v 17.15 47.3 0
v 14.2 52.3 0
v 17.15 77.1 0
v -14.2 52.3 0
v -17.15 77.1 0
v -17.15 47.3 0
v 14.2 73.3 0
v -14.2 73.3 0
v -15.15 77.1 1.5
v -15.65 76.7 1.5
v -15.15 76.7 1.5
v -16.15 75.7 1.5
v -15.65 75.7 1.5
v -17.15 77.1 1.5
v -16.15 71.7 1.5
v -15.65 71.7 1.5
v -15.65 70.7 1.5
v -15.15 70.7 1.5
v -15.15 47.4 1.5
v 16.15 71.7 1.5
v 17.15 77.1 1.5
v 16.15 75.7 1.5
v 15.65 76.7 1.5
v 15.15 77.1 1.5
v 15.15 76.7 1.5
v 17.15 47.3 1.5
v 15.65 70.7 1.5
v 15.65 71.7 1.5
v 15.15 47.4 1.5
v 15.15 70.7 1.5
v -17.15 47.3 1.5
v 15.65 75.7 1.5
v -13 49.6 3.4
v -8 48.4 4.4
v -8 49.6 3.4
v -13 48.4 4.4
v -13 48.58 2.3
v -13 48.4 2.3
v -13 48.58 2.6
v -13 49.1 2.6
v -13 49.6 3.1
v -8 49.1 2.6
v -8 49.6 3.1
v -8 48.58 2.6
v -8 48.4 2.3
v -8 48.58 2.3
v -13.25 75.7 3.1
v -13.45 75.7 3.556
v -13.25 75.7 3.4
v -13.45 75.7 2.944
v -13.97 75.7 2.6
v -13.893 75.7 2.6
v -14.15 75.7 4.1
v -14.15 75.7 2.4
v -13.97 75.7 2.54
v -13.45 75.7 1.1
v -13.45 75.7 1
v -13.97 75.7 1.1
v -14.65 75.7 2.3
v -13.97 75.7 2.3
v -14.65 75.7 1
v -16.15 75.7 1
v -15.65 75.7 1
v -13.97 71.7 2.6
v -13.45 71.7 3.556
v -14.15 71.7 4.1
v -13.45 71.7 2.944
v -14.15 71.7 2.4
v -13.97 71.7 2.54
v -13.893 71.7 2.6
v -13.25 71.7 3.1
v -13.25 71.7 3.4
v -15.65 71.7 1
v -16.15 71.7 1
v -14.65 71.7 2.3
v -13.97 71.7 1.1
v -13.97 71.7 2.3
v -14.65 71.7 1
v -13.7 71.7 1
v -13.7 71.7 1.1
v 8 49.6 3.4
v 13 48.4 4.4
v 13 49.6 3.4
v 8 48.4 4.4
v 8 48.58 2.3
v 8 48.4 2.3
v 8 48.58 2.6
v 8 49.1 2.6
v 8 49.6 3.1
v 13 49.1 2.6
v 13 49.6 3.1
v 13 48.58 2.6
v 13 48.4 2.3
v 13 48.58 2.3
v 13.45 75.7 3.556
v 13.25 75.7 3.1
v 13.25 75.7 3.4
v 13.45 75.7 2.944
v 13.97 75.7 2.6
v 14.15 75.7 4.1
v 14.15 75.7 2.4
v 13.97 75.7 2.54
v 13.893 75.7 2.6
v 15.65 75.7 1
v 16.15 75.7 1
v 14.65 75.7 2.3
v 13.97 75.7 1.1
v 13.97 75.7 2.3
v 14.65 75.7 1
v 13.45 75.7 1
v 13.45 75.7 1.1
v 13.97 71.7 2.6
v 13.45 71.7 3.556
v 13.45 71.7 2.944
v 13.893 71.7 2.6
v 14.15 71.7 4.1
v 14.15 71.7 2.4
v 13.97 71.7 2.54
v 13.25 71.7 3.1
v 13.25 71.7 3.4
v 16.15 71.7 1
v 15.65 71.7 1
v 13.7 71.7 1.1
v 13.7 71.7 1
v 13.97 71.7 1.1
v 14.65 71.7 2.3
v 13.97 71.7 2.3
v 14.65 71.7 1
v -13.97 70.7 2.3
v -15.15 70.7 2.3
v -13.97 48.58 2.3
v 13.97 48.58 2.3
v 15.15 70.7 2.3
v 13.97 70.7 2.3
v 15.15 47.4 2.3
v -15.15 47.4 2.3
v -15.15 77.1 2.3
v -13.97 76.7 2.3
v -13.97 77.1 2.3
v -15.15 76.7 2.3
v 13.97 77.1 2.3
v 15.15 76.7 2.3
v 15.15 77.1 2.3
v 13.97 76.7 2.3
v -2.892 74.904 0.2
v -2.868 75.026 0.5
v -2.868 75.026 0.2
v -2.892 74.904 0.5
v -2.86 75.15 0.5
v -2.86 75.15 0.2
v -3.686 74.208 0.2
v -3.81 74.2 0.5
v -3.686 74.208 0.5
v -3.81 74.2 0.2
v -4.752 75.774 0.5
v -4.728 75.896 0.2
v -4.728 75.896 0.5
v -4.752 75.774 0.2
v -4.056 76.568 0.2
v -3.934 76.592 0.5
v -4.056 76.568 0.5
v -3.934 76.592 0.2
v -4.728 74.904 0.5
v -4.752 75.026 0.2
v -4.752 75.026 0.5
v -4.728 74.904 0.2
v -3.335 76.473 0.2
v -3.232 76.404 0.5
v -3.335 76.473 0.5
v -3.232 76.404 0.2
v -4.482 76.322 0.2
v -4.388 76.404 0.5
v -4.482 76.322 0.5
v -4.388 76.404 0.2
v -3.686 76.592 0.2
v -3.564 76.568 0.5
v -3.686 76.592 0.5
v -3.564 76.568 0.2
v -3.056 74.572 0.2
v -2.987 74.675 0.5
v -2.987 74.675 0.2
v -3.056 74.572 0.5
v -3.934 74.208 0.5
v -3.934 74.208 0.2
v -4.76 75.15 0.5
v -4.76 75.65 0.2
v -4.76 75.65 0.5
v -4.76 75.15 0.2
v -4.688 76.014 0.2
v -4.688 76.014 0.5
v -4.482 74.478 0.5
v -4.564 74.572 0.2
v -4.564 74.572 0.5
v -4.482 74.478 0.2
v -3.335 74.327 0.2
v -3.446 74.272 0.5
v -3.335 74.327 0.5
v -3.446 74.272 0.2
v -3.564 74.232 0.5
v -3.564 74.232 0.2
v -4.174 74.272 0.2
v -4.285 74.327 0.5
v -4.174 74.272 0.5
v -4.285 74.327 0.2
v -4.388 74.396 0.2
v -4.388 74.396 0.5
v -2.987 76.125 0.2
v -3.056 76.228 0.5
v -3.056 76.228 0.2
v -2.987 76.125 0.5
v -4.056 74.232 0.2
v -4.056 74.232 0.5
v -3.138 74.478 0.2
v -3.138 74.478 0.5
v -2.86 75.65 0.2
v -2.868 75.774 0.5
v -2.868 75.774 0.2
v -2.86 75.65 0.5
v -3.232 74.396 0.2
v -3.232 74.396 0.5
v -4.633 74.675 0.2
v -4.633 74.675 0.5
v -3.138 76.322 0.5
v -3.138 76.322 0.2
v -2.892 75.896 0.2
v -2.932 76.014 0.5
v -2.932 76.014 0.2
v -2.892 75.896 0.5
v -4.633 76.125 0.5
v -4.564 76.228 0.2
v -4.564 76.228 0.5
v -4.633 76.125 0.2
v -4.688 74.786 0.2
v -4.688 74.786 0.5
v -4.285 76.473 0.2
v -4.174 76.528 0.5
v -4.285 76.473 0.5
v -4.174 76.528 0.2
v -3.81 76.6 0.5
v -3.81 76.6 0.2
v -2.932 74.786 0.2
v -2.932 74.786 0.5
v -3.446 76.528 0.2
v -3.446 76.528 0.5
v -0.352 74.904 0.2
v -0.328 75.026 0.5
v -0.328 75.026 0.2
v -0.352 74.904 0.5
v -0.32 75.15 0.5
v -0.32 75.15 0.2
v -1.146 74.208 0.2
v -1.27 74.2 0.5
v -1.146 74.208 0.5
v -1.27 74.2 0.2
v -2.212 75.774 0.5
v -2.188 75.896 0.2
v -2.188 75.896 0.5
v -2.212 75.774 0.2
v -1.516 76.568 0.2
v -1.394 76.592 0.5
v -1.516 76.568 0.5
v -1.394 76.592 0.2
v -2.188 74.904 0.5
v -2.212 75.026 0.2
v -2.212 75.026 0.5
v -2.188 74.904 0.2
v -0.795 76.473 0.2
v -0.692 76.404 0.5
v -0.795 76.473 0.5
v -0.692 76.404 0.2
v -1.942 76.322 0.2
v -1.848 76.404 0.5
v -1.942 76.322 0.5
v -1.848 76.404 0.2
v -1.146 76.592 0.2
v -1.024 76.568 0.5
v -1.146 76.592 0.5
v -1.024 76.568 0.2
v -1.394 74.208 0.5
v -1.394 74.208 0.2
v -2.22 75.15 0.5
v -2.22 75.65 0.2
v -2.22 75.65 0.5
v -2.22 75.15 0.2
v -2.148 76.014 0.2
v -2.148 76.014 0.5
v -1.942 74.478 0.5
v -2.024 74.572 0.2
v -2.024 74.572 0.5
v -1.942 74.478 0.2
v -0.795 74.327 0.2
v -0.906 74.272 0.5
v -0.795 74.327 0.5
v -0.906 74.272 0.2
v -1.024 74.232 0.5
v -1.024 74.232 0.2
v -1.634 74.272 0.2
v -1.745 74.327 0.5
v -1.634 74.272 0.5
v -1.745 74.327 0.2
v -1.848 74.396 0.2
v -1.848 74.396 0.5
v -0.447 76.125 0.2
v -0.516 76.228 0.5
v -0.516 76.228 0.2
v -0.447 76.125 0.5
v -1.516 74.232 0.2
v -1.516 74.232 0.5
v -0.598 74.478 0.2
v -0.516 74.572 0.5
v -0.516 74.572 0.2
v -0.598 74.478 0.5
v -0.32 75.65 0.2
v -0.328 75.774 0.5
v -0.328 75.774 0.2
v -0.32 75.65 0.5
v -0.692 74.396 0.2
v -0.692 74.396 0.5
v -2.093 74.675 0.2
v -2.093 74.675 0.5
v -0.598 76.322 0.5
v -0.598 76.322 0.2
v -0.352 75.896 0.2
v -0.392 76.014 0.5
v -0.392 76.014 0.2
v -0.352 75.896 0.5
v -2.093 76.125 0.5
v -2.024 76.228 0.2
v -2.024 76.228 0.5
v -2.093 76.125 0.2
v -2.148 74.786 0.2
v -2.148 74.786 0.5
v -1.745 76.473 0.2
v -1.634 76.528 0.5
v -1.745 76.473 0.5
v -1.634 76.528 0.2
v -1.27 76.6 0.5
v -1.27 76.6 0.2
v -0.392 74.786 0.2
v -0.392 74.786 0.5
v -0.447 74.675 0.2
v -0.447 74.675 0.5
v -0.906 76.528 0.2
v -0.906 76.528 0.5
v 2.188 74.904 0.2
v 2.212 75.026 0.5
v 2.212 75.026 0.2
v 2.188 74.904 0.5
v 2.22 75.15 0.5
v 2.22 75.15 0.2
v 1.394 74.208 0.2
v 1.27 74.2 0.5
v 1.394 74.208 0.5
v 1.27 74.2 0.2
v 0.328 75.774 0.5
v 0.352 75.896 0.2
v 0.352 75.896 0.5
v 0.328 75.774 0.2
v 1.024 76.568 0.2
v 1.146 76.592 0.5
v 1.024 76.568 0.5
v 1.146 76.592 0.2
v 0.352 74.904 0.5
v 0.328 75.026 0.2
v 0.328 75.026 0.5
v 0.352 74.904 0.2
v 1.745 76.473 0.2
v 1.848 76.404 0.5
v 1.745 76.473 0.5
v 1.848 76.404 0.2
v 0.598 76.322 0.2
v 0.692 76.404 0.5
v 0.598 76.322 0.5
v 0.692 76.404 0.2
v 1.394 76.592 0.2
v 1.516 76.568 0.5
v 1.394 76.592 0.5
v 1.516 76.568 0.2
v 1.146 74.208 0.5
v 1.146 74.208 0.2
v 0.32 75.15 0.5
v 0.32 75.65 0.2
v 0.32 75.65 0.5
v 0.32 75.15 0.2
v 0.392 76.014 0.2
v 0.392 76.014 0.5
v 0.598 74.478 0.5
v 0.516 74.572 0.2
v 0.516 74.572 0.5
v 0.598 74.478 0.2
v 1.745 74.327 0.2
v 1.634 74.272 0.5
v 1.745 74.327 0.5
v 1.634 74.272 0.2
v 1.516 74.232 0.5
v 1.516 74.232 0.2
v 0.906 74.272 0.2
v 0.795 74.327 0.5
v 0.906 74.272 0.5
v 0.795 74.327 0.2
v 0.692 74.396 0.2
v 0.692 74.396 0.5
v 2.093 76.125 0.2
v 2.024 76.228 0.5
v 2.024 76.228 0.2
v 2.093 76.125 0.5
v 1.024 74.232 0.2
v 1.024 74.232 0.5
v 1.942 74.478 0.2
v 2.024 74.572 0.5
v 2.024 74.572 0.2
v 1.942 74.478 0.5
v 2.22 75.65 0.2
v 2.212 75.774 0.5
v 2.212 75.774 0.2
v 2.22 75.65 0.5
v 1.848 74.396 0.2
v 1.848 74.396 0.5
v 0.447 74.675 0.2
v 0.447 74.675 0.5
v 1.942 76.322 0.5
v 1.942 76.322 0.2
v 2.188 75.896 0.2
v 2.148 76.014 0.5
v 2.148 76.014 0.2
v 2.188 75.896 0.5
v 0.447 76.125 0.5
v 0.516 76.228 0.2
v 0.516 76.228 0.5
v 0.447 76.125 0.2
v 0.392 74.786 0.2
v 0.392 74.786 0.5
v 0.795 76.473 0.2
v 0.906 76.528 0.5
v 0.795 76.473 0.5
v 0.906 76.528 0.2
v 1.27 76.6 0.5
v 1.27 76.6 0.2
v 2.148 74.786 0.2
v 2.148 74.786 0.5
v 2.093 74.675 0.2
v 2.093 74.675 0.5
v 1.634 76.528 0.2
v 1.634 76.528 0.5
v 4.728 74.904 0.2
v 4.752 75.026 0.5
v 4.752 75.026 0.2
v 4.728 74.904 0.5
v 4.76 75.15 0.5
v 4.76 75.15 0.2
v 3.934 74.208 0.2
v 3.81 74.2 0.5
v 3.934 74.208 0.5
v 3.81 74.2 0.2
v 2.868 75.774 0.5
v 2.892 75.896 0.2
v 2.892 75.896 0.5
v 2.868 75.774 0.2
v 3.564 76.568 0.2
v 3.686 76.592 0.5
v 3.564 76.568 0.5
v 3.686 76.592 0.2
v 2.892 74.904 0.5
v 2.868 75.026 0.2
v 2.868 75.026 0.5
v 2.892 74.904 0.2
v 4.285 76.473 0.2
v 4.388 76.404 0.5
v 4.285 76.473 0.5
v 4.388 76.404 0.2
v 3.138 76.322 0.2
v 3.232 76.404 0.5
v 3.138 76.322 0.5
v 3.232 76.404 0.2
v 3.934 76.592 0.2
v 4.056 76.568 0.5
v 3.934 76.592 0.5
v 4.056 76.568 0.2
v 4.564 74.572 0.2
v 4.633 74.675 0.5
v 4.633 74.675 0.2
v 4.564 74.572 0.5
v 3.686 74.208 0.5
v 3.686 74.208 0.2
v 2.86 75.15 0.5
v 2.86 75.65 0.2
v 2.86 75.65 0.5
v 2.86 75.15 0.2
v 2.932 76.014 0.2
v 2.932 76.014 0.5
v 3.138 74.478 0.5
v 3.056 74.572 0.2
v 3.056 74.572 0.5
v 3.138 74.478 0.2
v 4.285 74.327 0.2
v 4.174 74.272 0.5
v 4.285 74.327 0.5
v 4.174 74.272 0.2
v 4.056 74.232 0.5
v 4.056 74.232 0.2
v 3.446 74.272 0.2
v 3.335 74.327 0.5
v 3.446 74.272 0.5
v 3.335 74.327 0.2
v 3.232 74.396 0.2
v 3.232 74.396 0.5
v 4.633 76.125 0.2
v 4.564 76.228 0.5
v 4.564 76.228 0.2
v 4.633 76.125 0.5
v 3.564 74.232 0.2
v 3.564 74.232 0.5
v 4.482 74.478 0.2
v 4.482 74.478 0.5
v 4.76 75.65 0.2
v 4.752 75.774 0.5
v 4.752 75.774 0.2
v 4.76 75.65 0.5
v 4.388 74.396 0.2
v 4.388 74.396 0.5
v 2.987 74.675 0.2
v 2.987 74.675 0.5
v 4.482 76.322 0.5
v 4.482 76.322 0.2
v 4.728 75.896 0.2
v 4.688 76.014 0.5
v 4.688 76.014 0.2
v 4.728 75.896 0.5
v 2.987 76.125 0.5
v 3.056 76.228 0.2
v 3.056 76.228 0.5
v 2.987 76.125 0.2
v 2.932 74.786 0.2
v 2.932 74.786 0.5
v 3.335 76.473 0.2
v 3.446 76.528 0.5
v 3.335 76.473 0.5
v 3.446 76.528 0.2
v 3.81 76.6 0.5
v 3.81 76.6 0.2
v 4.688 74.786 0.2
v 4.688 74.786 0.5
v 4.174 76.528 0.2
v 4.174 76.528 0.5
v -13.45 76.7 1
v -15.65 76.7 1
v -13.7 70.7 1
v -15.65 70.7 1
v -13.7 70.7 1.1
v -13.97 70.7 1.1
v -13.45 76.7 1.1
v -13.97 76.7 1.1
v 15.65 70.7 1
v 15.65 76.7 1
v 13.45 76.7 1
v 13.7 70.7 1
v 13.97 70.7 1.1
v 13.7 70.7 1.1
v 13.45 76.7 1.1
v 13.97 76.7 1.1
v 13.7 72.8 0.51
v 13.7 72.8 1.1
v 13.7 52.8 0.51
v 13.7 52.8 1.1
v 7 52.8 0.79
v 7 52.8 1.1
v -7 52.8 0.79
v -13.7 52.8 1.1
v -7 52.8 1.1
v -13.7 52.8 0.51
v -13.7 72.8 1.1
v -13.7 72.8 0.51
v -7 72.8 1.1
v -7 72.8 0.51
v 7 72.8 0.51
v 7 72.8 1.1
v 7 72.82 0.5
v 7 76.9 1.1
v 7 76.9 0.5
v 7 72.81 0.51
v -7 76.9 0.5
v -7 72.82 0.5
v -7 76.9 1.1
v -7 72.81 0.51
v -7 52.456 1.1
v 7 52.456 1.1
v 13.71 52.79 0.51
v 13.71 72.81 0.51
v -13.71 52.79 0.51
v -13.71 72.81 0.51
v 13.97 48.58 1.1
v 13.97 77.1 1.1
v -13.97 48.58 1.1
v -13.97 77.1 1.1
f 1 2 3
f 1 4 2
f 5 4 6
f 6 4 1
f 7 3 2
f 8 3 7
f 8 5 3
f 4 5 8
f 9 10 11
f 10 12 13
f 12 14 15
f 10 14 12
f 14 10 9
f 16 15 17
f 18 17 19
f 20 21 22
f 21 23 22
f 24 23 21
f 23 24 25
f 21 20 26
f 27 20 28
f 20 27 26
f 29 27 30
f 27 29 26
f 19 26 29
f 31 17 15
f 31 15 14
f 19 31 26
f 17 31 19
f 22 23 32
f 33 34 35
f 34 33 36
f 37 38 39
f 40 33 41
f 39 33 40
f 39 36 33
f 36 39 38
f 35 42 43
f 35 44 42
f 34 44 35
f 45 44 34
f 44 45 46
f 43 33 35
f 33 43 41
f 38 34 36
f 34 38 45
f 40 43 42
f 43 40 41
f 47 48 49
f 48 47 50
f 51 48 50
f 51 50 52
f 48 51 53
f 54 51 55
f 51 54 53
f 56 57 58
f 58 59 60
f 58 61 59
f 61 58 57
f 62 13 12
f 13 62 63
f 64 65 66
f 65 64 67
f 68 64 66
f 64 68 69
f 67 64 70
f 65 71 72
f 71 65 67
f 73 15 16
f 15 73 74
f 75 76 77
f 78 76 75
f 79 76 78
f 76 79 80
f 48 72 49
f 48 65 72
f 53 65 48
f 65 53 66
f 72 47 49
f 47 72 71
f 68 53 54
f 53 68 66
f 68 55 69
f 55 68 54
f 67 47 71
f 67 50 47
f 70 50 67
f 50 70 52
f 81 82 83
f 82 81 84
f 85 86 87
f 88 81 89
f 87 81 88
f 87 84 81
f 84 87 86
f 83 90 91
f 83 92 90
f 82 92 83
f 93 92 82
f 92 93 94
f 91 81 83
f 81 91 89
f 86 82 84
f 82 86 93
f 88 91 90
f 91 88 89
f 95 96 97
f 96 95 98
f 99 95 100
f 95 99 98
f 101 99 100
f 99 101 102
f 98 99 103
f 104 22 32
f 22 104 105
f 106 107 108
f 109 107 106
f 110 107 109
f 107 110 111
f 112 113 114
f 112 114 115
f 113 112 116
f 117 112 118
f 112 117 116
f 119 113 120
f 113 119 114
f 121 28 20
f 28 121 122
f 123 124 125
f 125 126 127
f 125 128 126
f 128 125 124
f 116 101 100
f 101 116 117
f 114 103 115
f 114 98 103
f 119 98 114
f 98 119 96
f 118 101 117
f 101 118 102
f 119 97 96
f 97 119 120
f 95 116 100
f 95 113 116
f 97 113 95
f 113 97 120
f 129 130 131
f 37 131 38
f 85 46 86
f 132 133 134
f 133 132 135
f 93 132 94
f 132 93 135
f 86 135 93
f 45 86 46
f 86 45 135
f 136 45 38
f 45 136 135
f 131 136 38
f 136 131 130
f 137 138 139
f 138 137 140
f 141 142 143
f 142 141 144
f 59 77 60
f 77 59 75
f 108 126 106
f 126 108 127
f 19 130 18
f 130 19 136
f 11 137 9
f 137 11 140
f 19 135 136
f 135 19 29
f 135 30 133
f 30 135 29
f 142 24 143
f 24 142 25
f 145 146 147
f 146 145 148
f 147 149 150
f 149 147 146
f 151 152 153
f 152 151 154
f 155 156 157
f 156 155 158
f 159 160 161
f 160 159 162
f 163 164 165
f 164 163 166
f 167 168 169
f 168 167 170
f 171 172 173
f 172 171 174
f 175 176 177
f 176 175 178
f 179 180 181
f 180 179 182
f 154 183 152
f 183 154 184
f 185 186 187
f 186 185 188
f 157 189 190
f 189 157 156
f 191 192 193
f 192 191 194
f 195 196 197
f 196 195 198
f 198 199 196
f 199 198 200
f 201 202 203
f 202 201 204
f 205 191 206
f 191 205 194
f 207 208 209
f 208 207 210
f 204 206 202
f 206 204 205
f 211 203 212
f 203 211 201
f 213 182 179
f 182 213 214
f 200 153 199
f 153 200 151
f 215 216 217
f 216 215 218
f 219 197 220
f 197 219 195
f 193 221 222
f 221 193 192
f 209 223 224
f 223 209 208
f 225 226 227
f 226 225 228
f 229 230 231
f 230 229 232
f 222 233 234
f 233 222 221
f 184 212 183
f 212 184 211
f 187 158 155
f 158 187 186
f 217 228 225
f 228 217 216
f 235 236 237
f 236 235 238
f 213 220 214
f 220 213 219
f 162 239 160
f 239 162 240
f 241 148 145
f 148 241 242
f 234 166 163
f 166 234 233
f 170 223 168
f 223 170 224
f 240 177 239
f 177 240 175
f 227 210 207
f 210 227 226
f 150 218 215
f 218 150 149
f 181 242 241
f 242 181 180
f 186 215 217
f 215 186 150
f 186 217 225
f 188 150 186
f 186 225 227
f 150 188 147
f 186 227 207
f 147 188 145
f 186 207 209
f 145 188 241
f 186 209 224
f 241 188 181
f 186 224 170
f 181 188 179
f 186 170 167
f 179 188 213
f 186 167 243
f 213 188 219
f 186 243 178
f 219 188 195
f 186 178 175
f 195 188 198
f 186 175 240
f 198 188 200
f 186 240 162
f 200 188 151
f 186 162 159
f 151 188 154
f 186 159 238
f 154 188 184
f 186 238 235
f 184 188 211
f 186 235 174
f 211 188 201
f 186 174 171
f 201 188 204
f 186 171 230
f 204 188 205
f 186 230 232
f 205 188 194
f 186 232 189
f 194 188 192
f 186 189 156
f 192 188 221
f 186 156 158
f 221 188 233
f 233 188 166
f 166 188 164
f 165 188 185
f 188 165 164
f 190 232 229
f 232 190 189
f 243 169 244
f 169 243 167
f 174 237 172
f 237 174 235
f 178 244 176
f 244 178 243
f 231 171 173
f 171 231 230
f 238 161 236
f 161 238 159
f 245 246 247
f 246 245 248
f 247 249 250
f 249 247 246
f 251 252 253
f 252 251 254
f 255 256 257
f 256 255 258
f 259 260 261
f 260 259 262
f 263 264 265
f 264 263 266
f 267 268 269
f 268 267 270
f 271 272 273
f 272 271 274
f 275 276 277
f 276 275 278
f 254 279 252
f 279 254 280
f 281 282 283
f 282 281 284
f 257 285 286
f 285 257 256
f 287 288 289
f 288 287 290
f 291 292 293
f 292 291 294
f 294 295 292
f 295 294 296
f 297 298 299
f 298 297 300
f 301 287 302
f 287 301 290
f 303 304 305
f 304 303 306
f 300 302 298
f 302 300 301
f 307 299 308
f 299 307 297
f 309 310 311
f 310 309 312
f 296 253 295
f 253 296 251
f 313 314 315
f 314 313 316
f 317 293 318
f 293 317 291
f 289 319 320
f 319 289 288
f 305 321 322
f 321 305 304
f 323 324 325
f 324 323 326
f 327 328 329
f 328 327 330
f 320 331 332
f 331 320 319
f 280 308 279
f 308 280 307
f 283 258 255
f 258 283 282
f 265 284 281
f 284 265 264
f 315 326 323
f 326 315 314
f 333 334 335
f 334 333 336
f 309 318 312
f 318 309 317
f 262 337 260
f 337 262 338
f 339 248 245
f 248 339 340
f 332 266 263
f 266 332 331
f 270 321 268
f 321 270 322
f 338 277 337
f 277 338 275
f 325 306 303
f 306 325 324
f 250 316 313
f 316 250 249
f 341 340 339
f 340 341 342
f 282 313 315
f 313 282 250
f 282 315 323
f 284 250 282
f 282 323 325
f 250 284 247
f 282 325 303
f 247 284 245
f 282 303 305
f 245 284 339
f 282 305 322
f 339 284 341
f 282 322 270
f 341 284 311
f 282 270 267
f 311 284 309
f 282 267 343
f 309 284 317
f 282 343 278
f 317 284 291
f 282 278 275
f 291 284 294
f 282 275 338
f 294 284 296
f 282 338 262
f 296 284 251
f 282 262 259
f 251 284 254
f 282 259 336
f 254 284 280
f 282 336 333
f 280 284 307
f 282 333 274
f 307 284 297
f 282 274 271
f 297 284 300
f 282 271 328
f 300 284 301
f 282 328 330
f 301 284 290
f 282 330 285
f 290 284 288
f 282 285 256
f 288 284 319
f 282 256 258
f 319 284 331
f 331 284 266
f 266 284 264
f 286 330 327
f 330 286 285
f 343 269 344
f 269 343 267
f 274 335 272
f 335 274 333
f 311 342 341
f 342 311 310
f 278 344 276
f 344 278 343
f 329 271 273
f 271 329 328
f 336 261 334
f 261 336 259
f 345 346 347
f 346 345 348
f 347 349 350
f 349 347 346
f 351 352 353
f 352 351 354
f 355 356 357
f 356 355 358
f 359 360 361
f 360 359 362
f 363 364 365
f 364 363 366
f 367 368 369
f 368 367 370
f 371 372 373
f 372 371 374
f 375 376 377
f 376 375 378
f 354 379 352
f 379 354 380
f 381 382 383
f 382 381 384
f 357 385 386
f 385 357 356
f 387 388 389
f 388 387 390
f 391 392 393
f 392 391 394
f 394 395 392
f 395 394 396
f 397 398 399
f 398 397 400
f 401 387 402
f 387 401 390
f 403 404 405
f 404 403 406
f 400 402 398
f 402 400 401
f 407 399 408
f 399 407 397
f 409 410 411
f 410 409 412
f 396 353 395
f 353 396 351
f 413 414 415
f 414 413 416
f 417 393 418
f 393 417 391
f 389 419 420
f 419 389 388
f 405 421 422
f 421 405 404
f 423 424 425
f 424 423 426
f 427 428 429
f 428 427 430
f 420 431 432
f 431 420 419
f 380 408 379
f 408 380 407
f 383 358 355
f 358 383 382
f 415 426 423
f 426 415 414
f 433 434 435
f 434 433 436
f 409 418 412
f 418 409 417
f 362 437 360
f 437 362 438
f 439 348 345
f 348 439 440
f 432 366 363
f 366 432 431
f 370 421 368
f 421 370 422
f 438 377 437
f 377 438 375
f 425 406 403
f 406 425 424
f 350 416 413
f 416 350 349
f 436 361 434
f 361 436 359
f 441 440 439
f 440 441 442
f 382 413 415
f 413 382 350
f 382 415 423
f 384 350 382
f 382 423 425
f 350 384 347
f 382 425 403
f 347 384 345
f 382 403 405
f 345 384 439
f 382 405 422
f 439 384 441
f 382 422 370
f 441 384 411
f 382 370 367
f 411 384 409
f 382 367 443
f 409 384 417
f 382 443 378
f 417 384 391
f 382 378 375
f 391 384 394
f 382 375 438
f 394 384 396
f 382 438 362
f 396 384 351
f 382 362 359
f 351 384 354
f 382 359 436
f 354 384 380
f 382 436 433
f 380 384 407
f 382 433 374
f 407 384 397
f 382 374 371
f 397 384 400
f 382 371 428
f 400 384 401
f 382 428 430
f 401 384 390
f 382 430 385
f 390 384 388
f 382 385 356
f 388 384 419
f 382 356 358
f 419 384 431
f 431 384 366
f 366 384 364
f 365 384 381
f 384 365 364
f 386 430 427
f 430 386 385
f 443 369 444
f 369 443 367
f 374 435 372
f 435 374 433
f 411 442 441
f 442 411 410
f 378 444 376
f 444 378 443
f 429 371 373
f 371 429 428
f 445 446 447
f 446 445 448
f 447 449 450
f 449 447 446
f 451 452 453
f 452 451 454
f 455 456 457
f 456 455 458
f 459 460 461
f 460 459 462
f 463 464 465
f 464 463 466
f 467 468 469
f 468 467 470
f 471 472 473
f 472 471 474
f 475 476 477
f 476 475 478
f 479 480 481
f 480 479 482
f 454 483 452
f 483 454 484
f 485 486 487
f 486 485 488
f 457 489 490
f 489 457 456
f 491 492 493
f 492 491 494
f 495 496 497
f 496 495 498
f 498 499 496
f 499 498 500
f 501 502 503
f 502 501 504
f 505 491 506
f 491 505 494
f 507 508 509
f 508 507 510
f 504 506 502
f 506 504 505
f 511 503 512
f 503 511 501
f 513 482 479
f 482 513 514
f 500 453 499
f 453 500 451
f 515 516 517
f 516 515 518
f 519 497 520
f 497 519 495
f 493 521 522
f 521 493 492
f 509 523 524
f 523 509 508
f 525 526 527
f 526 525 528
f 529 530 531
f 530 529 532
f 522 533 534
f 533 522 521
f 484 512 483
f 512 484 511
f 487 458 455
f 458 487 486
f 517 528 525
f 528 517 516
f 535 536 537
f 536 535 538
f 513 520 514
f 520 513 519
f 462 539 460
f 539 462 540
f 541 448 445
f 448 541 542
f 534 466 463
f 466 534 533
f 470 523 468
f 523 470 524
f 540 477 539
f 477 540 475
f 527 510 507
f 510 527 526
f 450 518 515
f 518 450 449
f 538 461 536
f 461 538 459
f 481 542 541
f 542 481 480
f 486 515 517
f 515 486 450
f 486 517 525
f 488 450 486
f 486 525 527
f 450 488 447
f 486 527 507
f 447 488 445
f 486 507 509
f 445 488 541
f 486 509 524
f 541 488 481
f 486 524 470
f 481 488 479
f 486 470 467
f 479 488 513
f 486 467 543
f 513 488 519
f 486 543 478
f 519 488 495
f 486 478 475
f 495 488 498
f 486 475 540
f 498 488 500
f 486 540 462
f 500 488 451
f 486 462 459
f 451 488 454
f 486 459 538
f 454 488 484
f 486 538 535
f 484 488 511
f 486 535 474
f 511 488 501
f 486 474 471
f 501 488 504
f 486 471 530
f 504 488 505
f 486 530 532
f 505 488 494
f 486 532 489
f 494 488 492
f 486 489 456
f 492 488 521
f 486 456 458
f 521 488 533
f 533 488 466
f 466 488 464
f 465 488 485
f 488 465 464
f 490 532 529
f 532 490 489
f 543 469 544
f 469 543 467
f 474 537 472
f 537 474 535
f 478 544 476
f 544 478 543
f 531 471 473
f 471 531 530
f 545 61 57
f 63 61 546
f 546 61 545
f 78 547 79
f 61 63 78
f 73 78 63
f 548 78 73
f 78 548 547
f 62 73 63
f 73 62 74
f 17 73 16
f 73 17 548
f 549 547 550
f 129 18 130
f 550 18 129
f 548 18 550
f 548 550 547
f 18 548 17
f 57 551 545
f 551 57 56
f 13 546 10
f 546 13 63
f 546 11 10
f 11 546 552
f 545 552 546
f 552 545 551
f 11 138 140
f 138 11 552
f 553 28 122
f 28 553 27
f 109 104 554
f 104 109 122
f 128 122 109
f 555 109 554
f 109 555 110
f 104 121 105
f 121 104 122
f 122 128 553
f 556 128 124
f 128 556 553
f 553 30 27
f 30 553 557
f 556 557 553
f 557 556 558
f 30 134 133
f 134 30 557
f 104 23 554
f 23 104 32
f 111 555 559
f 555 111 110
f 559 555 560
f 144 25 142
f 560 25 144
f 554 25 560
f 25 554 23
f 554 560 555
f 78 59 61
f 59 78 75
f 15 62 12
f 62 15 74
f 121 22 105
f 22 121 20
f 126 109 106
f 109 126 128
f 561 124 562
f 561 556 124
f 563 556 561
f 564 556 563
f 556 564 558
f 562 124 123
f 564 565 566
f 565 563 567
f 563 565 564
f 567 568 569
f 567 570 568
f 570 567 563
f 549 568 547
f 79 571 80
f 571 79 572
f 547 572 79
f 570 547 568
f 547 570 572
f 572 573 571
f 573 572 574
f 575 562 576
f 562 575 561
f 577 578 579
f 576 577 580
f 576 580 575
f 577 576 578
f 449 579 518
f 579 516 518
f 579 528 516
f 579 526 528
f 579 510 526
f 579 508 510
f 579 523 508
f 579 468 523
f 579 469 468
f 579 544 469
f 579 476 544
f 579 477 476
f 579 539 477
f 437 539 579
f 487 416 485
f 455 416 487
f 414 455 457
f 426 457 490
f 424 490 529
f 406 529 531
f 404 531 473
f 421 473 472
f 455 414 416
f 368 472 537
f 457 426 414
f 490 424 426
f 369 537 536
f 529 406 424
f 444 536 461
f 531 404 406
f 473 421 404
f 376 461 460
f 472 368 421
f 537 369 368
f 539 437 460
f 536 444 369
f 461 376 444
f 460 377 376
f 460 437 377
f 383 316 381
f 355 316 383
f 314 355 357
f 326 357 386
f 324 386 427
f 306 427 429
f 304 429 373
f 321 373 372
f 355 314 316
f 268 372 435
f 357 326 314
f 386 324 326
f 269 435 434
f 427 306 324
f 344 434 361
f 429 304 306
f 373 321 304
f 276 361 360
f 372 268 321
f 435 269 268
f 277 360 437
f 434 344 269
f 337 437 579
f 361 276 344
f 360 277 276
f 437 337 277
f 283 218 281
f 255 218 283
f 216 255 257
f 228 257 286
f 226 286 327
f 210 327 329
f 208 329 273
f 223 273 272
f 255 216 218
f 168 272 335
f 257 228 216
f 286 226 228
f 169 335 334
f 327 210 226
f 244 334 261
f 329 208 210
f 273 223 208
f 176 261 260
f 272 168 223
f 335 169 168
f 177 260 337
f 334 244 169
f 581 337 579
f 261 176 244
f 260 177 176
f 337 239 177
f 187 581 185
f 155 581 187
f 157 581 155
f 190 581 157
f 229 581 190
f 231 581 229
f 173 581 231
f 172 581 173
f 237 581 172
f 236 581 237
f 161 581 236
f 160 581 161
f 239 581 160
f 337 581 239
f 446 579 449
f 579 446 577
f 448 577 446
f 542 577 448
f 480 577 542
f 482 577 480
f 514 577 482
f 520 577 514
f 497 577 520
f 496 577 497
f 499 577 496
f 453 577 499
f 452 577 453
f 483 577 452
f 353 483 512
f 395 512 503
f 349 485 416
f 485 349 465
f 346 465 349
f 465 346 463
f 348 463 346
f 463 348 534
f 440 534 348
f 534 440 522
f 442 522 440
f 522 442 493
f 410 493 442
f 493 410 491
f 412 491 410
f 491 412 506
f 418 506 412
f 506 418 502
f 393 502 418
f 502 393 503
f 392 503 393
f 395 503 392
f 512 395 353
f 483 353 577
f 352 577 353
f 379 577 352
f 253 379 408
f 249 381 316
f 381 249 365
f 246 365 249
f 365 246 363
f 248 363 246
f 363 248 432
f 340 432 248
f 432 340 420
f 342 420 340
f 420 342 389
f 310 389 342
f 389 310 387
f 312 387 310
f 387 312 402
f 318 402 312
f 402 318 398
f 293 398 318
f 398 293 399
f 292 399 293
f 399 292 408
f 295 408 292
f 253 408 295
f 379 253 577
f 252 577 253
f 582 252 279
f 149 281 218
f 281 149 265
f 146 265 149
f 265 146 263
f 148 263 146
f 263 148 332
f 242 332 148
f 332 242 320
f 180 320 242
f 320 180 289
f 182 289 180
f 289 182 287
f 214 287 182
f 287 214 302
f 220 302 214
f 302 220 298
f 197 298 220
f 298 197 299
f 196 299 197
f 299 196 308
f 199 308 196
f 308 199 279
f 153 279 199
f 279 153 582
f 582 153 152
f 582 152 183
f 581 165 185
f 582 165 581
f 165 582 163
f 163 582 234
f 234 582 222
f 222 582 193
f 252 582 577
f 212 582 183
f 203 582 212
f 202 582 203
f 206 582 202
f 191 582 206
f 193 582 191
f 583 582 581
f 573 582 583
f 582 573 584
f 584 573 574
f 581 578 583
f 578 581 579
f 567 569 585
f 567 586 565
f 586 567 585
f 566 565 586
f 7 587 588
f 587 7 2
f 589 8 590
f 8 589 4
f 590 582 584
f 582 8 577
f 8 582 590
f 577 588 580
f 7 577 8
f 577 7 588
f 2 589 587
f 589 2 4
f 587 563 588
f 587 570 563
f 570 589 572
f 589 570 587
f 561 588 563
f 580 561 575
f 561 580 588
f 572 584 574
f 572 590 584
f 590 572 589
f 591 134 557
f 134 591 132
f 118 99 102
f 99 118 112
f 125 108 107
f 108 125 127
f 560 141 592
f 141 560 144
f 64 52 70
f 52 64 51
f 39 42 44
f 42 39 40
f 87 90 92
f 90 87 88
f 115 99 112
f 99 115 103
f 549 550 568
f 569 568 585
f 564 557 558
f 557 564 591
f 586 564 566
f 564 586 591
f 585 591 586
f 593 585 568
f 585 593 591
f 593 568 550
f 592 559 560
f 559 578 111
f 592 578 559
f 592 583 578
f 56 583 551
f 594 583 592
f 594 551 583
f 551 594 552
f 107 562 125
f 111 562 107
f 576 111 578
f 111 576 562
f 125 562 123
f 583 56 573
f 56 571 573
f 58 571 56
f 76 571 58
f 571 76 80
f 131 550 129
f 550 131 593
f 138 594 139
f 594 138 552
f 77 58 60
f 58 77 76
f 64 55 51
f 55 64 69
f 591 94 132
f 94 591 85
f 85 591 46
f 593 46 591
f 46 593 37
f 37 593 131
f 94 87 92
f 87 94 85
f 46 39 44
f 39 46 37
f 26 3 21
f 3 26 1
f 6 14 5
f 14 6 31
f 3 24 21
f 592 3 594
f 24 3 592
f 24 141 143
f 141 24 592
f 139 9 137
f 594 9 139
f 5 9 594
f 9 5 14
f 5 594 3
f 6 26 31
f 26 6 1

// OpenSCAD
// OLED fit gauge, print first: only the shell's face and seats round the OLED, cut from the real shell()
// so every depth is the shell's. Print flat, face down. See gauge_oled() in model.scad.
include <model.scad>
view = "gauge_oled";
